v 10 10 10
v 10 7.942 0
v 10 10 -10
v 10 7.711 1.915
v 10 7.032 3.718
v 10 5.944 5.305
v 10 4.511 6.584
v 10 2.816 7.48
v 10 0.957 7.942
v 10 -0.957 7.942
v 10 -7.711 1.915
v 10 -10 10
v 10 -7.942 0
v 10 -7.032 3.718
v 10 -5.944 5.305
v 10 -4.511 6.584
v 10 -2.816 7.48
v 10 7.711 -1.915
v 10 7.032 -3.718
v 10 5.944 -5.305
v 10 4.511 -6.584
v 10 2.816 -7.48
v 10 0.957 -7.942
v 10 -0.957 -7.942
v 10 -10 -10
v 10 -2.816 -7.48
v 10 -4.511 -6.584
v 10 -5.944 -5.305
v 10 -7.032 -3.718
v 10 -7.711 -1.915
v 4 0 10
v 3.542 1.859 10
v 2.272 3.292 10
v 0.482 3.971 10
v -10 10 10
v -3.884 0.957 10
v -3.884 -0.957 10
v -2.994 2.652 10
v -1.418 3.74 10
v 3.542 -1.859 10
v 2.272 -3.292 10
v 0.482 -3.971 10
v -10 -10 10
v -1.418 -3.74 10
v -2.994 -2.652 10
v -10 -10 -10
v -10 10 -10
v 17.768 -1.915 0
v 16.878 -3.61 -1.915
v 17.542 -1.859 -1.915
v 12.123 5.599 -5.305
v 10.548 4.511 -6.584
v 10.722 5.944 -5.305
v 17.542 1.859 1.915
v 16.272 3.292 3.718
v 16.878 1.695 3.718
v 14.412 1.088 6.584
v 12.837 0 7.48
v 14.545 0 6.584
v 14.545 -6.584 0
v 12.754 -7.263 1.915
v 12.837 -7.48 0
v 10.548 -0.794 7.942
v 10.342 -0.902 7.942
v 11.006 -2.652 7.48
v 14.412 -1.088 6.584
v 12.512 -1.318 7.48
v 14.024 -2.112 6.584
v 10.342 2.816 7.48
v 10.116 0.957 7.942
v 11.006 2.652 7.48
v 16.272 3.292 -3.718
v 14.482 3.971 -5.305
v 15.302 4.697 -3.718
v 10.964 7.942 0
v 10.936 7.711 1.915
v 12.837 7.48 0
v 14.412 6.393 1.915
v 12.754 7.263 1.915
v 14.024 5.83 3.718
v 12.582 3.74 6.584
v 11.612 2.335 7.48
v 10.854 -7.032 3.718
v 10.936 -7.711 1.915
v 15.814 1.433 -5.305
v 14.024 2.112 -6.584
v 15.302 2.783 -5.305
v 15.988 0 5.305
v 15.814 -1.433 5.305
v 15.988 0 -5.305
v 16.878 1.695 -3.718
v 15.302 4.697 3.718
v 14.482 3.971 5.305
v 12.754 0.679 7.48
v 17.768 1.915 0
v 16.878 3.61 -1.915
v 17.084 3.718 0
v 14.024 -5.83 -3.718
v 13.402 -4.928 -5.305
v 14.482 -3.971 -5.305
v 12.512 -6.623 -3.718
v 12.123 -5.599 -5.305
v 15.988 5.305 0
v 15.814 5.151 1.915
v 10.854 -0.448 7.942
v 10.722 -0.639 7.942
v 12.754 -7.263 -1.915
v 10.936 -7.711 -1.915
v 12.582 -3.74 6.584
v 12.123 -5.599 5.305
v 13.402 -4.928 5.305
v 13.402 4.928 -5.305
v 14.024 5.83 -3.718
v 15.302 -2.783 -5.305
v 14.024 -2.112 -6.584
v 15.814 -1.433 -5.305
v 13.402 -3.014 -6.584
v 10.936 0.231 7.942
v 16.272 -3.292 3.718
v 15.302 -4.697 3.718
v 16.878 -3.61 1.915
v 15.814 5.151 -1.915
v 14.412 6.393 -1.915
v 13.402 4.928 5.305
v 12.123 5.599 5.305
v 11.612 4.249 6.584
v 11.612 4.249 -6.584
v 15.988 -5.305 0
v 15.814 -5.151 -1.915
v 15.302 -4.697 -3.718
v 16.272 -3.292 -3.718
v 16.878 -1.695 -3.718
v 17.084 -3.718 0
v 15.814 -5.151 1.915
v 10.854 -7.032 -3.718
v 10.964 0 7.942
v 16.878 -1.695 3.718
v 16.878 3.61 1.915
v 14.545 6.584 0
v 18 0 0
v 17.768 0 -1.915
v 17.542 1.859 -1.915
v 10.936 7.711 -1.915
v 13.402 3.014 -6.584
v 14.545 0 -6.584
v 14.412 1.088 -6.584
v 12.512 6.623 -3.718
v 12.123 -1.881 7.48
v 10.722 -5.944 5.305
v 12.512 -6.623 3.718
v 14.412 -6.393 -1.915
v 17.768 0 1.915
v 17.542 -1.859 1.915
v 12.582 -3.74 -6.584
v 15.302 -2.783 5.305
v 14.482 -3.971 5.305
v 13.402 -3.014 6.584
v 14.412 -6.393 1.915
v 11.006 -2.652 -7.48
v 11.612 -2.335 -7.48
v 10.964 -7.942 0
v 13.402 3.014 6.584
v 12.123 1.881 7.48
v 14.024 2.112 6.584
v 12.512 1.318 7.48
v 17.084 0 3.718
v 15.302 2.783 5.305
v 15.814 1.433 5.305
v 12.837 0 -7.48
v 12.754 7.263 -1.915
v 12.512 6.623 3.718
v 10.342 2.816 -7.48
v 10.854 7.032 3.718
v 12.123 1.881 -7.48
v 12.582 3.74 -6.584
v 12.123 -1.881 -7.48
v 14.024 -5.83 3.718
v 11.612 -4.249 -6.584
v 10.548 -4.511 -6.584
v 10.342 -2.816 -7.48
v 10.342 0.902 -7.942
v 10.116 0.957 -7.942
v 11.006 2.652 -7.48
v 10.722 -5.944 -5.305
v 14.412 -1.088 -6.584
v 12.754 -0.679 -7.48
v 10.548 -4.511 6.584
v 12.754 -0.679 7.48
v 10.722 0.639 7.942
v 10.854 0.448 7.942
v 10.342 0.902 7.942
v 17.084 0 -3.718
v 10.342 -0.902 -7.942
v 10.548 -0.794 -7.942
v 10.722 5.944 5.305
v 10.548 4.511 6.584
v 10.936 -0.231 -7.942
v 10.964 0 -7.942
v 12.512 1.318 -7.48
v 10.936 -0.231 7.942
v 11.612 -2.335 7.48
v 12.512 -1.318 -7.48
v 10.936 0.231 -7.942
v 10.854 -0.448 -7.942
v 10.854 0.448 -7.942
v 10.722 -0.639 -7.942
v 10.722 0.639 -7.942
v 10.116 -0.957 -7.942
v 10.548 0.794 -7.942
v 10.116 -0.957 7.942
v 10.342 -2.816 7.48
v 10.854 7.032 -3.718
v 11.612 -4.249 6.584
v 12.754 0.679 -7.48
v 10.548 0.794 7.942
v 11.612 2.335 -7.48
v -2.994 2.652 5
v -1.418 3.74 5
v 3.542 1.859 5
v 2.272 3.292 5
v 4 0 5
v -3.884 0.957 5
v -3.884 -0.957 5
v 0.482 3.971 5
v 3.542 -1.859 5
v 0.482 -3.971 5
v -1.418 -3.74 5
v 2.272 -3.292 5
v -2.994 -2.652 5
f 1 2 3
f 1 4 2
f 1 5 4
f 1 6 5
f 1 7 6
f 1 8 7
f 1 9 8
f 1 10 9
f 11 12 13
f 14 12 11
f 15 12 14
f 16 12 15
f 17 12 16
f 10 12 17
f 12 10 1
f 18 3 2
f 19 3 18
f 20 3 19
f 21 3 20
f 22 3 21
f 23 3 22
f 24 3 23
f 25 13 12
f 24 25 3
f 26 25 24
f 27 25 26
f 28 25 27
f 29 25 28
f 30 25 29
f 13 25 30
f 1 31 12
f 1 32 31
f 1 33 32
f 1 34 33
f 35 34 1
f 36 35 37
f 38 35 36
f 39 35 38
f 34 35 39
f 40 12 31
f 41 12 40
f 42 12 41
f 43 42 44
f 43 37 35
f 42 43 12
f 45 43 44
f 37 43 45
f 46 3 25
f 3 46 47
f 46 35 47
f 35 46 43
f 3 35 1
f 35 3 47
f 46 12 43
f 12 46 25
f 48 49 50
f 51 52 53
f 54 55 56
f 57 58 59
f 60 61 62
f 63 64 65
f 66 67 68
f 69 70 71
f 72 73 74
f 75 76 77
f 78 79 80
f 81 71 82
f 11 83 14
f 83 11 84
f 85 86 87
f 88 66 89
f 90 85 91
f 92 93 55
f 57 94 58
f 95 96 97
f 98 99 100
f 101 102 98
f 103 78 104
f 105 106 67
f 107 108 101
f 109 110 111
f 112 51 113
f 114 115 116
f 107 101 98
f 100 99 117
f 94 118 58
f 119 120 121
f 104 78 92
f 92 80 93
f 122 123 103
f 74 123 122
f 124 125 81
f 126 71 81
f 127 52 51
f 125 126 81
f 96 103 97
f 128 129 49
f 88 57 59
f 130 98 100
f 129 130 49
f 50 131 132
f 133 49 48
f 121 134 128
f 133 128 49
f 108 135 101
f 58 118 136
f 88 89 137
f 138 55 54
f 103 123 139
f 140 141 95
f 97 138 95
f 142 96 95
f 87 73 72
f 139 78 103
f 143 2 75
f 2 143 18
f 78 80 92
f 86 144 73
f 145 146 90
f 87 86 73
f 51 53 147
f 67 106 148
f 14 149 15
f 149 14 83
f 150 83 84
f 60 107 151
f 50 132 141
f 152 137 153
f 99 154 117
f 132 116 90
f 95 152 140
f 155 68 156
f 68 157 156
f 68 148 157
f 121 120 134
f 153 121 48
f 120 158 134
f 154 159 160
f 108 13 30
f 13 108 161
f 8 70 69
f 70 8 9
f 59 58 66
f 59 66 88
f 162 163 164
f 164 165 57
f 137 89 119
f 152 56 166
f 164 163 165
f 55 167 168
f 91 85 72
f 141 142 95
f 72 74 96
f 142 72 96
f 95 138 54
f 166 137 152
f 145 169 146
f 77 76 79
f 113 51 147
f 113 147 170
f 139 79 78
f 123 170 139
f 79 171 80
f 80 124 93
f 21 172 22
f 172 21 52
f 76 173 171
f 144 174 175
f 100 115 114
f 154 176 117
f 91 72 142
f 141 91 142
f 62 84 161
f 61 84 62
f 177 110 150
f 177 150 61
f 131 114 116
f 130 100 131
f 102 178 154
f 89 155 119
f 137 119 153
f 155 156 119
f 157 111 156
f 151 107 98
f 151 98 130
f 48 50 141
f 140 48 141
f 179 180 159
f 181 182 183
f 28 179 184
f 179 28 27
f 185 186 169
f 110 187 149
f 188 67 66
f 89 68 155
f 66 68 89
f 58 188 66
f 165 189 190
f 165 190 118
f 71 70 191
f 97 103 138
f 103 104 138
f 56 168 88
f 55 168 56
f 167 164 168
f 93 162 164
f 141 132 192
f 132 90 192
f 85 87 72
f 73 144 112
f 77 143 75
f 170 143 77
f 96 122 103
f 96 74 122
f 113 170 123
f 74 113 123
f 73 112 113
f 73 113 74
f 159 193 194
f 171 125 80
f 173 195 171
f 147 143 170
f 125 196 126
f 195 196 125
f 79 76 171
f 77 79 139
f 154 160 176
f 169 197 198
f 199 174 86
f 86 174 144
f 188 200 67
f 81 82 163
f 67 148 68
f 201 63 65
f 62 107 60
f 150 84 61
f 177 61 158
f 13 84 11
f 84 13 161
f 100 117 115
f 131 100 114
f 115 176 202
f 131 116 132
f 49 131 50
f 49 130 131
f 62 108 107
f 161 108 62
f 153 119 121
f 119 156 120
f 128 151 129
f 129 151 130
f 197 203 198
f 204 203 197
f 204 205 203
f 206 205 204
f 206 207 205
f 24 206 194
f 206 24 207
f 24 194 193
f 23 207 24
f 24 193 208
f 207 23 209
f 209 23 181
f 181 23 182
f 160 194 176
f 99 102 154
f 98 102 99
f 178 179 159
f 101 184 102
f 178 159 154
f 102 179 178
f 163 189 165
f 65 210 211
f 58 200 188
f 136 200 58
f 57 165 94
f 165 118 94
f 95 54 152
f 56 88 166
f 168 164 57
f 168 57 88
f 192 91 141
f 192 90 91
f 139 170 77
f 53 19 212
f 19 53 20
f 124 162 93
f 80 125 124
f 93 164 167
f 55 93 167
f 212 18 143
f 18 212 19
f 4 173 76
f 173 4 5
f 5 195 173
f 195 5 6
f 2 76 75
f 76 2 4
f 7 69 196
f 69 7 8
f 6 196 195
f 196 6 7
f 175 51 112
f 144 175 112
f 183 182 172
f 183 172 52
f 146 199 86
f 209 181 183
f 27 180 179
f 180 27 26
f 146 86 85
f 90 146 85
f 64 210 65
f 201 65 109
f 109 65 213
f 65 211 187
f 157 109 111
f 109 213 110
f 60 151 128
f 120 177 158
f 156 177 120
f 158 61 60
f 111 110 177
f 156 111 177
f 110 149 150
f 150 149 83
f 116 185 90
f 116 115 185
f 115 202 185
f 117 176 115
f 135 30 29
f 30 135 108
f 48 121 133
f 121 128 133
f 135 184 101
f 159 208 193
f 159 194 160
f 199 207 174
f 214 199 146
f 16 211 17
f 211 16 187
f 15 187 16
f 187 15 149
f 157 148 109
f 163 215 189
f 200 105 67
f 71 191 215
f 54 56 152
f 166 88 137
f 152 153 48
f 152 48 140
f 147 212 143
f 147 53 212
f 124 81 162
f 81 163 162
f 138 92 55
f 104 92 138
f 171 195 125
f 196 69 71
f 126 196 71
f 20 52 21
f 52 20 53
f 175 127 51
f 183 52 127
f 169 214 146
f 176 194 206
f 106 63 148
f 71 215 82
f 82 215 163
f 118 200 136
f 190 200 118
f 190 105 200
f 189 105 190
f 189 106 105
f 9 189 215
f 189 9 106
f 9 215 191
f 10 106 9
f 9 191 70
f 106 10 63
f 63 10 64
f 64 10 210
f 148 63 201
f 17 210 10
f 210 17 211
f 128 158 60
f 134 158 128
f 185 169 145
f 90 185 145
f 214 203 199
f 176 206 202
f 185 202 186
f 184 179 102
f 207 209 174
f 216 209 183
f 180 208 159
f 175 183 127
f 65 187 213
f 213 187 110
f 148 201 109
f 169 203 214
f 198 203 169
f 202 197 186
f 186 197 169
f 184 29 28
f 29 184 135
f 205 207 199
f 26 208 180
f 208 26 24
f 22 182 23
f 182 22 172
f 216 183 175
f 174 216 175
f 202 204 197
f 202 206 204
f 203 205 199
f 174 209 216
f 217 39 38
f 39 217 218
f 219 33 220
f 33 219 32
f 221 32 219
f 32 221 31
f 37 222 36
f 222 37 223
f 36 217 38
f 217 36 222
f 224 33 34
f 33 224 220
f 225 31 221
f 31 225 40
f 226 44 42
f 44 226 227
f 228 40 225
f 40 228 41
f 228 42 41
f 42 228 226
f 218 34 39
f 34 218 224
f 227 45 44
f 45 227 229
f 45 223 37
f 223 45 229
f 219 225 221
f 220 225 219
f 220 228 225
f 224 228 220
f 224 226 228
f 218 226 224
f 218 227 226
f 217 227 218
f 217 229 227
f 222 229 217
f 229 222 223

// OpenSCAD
difference() {
    union() {
        cube([20, 20, 20], center = true);
        translate([10, 0, 0]) sphere(r = 8);
    }
    translate([0, 0, 5]) cylinder(h = 25, r = 4);
}
